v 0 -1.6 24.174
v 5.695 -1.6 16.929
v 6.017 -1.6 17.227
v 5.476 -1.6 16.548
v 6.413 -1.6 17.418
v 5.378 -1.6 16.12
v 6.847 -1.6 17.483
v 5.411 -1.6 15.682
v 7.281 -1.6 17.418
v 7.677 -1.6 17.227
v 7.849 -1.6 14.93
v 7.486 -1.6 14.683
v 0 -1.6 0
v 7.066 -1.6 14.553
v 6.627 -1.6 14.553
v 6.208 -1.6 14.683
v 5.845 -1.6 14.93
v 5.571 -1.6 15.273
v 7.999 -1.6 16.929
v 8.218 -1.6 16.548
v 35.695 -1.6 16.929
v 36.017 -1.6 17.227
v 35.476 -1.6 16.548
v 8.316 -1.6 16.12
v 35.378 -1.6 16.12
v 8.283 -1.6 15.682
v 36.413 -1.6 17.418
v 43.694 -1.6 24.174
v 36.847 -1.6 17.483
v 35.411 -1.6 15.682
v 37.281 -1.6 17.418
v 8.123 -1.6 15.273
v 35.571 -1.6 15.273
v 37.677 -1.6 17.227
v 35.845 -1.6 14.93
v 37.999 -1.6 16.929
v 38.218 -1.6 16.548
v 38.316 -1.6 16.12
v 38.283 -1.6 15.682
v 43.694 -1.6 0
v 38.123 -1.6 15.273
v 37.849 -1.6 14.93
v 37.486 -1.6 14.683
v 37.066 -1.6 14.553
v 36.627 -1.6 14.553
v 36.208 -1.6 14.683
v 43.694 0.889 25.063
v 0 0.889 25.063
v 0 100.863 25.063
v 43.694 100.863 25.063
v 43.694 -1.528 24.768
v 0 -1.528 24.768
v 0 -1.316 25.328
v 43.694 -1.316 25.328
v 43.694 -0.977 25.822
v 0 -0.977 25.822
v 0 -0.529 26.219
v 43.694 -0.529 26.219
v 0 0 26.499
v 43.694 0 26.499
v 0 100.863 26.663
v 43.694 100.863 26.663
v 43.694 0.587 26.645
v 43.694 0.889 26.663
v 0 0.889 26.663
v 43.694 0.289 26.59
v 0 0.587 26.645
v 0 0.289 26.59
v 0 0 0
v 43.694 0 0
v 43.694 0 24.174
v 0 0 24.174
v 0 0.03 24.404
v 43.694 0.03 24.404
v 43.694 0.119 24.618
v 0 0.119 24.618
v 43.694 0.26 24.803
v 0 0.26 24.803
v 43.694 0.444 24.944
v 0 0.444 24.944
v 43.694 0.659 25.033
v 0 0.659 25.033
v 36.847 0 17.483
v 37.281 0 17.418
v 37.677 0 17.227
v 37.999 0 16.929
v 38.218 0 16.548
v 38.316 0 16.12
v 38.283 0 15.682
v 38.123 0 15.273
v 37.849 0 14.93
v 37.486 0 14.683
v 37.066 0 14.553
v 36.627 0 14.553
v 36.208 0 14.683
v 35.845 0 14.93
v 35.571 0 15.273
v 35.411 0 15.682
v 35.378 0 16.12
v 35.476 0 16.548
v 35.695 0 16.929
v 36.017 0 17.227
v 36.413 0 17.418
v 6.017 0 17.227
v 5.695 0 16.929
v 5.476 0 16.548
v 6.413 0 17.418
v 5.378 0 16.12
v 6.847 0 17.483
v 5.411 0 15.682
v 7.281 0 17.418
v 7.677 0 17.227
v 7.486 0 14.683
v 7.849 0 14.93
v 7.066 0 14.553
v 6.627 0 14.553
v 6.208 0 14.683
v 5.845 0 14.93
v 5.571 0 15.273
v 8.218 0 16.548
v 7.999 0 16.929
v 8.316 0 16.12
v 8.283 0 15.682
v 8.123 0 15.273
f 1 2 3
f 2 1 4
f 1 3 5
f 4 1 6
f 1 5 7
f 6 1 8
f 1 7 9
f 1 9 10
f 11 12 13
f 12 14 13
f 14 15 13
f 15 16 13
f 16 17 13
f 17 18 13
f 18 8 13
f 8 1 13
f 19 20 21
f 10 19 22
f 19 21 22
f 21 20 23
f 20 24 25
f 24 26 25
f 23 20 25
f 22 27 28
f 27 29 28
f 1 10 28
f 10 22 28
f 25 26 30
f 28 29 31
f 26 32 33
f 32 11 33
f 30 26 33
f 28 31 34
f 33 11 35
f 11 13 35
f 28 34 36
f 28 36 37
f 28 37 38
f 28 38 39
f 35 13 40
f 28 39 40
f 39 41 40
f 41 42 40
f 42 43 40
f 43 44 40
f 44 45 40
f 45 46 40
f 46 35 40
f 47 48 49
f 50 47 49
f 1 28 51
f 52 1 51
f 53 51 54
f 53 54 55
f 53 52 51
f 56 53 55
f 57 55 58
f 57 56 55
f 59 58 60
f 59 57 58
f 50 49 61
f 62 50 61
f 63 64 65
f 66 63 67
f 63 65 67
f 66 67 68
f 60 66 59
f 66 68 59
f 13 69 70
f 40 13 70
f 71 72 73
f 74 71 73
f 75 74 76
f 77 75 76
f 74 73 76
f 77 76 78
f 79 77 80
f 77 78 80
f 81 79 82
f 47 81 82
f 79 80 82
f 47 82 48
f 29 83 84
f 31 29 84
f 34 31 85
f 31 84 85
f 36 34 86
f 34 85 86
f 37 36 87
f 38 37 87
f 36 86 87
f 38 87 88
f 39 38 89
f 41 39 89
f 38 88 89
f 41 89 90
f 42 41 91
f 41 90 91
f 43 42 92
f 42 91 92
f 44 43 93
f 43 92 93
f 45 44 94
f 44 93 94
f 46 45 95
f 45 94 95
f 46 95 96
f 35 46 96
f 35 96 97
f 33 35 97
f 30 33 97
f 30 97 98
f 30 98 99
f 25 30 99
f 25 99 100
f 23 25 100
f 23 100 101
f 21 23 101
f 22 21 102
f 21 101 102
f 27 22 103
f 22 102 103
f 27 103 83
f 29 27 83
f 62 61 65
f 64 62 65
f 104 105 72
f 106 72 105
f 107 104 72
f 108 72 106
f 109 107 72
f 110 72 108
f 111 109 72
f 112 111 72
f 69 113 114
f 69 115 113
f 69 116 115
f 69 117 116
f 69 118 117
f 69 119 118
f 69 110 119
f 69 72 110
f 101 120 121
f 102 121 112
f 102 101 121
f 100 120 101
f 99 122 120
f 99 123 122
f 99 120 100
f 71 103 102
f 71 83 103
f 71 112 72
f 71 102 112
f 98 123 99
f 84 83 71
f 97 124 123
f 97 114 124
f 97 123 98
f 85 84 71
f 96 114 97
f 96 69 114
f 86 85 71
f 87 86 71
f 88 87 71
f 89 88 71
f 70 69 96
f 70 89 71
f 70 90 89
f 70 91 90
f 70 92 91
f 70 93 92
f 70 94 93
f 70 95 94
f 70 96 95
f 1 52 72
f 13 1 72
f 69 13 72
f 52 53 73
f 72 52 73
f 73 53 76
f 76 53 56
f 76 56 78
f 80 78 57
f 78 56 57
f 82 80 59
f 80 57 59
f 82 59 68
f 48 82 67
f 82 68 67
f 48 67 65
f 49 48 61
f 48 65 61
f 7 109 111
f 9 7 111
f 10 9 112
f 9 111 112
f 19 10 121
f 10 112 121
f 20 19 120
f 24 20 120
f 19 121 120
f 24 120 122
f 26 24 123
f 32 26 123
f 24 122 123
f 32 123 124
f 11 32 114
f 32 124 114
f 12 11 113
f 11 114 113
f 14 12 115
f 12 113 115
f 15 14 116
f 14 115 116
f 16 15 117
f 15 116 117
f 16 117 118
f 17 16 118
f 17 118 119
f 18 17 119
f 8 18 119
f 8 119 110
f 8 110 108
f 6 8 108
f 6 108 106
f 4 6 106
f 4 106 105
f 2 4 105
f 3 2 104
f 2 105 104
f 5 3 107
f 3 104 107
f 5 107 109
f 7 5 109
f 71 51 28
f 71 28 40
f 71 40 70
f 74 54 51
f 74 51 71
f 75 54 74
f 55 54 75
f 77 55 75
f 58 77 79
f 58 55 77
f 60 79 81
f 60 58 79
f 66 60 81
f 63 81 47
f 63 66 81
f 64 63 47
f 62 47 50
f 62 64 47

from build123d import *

# Parameters (mm, degrees)
SKETCH1_W              = 43.69375
SKETCH1_H              = 126.6
SKETCH1_R              = 1.4732
BASE_FLANGE1_DEPTH     = 1.6002
SKETCHED_BEND1_DEPTH   = 43.69375
SKETCHED_BEND1_2_DEPTH = 43.69375


# Read off the part's stored shape, not the designer's step: Sketched Bend1
# Sheet-metal steps are written as plain solids
with BuildPart() as part:
    # Sketch1 → Base-Flange1 (new body)
    with BuildSketch(Plane(origin=(0, 0, 0), x_dir=(1, 0, 0), z_dir=(0, 1, 0))):
        with Locations((21.846875, -63.3)):
            Rectangle(SKETCH1_W, SKETCH1_H)
        with Locations(Location((6.846875, -16.01, 0), (0, 0, 270))):
            Circle(SKETCH1_R, mode=Mode.SUBTRACT)
        with Locations(Location((36.846875, -16.01, 0), (0, 0, 270))):
            Circle(SKETCH1_R, mode=Mode.SUBTRACT)
    extrude(amount=-BASE_FLANGE1_DEPTH)

    # Sketched Bend1 outline → Sketched Bend1 (cut)
    with BuildSketch(Plane.YZ):
        with BuildLine():
            ThreePointArc((-1.6002, 24.173927493), (-1.16148963, 25.585171243), (0, 26.49896419))
            Line((0, 26.49896419), (0, 126.6))
            Line((0, 126.6), (-1.6002, 126.6))
            Line((-1.6002, 126.6), (-1.6002, 24.173927493))
        make_face()
    extrude(amount=SKETCHED_BEND1_DEPTH, mode=Mode.SUBTRACT)

    # Sketched Bend1 2 outline → Sketched Bend1 2 (add)
    with BuildSketch(Plane.YZ):
        with BuildLine():
            ThreePointArc((0, 24.173927493), (0.260382071, 24.802545421), (0.889, 25.062927493))
            Line((0.889, 25.062927493), (100.862927493, 25.062927493))
            Line((100.862927493, 25.062927493), (100.862927493, 26.663127493))
            Line((100.862927493, 26.663127493), (0.889, 26.663127493))
            ThreePointArc((0.889, 26.663127493), (0.436984903, 26.62174264), (0, 26.49896419))
            Line((0, 26.49896419), (0, 24.173927493))
        make_face()
    extrude(amount=SKETCHED_BEND1_2_DEPTH)


solid = part.part
